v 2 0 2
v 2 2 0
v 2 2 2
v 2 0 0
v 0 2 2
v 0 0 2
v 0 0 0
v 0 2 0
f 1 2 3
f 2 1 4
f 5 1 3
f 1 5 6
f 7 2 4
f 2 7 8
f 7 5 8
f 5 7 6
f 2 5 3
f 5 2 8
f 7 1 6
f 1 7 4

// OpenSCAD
$fn = 50;difference() {
	union() {
		cube(size = [2, 2, 2]);
	}
	union();
}
